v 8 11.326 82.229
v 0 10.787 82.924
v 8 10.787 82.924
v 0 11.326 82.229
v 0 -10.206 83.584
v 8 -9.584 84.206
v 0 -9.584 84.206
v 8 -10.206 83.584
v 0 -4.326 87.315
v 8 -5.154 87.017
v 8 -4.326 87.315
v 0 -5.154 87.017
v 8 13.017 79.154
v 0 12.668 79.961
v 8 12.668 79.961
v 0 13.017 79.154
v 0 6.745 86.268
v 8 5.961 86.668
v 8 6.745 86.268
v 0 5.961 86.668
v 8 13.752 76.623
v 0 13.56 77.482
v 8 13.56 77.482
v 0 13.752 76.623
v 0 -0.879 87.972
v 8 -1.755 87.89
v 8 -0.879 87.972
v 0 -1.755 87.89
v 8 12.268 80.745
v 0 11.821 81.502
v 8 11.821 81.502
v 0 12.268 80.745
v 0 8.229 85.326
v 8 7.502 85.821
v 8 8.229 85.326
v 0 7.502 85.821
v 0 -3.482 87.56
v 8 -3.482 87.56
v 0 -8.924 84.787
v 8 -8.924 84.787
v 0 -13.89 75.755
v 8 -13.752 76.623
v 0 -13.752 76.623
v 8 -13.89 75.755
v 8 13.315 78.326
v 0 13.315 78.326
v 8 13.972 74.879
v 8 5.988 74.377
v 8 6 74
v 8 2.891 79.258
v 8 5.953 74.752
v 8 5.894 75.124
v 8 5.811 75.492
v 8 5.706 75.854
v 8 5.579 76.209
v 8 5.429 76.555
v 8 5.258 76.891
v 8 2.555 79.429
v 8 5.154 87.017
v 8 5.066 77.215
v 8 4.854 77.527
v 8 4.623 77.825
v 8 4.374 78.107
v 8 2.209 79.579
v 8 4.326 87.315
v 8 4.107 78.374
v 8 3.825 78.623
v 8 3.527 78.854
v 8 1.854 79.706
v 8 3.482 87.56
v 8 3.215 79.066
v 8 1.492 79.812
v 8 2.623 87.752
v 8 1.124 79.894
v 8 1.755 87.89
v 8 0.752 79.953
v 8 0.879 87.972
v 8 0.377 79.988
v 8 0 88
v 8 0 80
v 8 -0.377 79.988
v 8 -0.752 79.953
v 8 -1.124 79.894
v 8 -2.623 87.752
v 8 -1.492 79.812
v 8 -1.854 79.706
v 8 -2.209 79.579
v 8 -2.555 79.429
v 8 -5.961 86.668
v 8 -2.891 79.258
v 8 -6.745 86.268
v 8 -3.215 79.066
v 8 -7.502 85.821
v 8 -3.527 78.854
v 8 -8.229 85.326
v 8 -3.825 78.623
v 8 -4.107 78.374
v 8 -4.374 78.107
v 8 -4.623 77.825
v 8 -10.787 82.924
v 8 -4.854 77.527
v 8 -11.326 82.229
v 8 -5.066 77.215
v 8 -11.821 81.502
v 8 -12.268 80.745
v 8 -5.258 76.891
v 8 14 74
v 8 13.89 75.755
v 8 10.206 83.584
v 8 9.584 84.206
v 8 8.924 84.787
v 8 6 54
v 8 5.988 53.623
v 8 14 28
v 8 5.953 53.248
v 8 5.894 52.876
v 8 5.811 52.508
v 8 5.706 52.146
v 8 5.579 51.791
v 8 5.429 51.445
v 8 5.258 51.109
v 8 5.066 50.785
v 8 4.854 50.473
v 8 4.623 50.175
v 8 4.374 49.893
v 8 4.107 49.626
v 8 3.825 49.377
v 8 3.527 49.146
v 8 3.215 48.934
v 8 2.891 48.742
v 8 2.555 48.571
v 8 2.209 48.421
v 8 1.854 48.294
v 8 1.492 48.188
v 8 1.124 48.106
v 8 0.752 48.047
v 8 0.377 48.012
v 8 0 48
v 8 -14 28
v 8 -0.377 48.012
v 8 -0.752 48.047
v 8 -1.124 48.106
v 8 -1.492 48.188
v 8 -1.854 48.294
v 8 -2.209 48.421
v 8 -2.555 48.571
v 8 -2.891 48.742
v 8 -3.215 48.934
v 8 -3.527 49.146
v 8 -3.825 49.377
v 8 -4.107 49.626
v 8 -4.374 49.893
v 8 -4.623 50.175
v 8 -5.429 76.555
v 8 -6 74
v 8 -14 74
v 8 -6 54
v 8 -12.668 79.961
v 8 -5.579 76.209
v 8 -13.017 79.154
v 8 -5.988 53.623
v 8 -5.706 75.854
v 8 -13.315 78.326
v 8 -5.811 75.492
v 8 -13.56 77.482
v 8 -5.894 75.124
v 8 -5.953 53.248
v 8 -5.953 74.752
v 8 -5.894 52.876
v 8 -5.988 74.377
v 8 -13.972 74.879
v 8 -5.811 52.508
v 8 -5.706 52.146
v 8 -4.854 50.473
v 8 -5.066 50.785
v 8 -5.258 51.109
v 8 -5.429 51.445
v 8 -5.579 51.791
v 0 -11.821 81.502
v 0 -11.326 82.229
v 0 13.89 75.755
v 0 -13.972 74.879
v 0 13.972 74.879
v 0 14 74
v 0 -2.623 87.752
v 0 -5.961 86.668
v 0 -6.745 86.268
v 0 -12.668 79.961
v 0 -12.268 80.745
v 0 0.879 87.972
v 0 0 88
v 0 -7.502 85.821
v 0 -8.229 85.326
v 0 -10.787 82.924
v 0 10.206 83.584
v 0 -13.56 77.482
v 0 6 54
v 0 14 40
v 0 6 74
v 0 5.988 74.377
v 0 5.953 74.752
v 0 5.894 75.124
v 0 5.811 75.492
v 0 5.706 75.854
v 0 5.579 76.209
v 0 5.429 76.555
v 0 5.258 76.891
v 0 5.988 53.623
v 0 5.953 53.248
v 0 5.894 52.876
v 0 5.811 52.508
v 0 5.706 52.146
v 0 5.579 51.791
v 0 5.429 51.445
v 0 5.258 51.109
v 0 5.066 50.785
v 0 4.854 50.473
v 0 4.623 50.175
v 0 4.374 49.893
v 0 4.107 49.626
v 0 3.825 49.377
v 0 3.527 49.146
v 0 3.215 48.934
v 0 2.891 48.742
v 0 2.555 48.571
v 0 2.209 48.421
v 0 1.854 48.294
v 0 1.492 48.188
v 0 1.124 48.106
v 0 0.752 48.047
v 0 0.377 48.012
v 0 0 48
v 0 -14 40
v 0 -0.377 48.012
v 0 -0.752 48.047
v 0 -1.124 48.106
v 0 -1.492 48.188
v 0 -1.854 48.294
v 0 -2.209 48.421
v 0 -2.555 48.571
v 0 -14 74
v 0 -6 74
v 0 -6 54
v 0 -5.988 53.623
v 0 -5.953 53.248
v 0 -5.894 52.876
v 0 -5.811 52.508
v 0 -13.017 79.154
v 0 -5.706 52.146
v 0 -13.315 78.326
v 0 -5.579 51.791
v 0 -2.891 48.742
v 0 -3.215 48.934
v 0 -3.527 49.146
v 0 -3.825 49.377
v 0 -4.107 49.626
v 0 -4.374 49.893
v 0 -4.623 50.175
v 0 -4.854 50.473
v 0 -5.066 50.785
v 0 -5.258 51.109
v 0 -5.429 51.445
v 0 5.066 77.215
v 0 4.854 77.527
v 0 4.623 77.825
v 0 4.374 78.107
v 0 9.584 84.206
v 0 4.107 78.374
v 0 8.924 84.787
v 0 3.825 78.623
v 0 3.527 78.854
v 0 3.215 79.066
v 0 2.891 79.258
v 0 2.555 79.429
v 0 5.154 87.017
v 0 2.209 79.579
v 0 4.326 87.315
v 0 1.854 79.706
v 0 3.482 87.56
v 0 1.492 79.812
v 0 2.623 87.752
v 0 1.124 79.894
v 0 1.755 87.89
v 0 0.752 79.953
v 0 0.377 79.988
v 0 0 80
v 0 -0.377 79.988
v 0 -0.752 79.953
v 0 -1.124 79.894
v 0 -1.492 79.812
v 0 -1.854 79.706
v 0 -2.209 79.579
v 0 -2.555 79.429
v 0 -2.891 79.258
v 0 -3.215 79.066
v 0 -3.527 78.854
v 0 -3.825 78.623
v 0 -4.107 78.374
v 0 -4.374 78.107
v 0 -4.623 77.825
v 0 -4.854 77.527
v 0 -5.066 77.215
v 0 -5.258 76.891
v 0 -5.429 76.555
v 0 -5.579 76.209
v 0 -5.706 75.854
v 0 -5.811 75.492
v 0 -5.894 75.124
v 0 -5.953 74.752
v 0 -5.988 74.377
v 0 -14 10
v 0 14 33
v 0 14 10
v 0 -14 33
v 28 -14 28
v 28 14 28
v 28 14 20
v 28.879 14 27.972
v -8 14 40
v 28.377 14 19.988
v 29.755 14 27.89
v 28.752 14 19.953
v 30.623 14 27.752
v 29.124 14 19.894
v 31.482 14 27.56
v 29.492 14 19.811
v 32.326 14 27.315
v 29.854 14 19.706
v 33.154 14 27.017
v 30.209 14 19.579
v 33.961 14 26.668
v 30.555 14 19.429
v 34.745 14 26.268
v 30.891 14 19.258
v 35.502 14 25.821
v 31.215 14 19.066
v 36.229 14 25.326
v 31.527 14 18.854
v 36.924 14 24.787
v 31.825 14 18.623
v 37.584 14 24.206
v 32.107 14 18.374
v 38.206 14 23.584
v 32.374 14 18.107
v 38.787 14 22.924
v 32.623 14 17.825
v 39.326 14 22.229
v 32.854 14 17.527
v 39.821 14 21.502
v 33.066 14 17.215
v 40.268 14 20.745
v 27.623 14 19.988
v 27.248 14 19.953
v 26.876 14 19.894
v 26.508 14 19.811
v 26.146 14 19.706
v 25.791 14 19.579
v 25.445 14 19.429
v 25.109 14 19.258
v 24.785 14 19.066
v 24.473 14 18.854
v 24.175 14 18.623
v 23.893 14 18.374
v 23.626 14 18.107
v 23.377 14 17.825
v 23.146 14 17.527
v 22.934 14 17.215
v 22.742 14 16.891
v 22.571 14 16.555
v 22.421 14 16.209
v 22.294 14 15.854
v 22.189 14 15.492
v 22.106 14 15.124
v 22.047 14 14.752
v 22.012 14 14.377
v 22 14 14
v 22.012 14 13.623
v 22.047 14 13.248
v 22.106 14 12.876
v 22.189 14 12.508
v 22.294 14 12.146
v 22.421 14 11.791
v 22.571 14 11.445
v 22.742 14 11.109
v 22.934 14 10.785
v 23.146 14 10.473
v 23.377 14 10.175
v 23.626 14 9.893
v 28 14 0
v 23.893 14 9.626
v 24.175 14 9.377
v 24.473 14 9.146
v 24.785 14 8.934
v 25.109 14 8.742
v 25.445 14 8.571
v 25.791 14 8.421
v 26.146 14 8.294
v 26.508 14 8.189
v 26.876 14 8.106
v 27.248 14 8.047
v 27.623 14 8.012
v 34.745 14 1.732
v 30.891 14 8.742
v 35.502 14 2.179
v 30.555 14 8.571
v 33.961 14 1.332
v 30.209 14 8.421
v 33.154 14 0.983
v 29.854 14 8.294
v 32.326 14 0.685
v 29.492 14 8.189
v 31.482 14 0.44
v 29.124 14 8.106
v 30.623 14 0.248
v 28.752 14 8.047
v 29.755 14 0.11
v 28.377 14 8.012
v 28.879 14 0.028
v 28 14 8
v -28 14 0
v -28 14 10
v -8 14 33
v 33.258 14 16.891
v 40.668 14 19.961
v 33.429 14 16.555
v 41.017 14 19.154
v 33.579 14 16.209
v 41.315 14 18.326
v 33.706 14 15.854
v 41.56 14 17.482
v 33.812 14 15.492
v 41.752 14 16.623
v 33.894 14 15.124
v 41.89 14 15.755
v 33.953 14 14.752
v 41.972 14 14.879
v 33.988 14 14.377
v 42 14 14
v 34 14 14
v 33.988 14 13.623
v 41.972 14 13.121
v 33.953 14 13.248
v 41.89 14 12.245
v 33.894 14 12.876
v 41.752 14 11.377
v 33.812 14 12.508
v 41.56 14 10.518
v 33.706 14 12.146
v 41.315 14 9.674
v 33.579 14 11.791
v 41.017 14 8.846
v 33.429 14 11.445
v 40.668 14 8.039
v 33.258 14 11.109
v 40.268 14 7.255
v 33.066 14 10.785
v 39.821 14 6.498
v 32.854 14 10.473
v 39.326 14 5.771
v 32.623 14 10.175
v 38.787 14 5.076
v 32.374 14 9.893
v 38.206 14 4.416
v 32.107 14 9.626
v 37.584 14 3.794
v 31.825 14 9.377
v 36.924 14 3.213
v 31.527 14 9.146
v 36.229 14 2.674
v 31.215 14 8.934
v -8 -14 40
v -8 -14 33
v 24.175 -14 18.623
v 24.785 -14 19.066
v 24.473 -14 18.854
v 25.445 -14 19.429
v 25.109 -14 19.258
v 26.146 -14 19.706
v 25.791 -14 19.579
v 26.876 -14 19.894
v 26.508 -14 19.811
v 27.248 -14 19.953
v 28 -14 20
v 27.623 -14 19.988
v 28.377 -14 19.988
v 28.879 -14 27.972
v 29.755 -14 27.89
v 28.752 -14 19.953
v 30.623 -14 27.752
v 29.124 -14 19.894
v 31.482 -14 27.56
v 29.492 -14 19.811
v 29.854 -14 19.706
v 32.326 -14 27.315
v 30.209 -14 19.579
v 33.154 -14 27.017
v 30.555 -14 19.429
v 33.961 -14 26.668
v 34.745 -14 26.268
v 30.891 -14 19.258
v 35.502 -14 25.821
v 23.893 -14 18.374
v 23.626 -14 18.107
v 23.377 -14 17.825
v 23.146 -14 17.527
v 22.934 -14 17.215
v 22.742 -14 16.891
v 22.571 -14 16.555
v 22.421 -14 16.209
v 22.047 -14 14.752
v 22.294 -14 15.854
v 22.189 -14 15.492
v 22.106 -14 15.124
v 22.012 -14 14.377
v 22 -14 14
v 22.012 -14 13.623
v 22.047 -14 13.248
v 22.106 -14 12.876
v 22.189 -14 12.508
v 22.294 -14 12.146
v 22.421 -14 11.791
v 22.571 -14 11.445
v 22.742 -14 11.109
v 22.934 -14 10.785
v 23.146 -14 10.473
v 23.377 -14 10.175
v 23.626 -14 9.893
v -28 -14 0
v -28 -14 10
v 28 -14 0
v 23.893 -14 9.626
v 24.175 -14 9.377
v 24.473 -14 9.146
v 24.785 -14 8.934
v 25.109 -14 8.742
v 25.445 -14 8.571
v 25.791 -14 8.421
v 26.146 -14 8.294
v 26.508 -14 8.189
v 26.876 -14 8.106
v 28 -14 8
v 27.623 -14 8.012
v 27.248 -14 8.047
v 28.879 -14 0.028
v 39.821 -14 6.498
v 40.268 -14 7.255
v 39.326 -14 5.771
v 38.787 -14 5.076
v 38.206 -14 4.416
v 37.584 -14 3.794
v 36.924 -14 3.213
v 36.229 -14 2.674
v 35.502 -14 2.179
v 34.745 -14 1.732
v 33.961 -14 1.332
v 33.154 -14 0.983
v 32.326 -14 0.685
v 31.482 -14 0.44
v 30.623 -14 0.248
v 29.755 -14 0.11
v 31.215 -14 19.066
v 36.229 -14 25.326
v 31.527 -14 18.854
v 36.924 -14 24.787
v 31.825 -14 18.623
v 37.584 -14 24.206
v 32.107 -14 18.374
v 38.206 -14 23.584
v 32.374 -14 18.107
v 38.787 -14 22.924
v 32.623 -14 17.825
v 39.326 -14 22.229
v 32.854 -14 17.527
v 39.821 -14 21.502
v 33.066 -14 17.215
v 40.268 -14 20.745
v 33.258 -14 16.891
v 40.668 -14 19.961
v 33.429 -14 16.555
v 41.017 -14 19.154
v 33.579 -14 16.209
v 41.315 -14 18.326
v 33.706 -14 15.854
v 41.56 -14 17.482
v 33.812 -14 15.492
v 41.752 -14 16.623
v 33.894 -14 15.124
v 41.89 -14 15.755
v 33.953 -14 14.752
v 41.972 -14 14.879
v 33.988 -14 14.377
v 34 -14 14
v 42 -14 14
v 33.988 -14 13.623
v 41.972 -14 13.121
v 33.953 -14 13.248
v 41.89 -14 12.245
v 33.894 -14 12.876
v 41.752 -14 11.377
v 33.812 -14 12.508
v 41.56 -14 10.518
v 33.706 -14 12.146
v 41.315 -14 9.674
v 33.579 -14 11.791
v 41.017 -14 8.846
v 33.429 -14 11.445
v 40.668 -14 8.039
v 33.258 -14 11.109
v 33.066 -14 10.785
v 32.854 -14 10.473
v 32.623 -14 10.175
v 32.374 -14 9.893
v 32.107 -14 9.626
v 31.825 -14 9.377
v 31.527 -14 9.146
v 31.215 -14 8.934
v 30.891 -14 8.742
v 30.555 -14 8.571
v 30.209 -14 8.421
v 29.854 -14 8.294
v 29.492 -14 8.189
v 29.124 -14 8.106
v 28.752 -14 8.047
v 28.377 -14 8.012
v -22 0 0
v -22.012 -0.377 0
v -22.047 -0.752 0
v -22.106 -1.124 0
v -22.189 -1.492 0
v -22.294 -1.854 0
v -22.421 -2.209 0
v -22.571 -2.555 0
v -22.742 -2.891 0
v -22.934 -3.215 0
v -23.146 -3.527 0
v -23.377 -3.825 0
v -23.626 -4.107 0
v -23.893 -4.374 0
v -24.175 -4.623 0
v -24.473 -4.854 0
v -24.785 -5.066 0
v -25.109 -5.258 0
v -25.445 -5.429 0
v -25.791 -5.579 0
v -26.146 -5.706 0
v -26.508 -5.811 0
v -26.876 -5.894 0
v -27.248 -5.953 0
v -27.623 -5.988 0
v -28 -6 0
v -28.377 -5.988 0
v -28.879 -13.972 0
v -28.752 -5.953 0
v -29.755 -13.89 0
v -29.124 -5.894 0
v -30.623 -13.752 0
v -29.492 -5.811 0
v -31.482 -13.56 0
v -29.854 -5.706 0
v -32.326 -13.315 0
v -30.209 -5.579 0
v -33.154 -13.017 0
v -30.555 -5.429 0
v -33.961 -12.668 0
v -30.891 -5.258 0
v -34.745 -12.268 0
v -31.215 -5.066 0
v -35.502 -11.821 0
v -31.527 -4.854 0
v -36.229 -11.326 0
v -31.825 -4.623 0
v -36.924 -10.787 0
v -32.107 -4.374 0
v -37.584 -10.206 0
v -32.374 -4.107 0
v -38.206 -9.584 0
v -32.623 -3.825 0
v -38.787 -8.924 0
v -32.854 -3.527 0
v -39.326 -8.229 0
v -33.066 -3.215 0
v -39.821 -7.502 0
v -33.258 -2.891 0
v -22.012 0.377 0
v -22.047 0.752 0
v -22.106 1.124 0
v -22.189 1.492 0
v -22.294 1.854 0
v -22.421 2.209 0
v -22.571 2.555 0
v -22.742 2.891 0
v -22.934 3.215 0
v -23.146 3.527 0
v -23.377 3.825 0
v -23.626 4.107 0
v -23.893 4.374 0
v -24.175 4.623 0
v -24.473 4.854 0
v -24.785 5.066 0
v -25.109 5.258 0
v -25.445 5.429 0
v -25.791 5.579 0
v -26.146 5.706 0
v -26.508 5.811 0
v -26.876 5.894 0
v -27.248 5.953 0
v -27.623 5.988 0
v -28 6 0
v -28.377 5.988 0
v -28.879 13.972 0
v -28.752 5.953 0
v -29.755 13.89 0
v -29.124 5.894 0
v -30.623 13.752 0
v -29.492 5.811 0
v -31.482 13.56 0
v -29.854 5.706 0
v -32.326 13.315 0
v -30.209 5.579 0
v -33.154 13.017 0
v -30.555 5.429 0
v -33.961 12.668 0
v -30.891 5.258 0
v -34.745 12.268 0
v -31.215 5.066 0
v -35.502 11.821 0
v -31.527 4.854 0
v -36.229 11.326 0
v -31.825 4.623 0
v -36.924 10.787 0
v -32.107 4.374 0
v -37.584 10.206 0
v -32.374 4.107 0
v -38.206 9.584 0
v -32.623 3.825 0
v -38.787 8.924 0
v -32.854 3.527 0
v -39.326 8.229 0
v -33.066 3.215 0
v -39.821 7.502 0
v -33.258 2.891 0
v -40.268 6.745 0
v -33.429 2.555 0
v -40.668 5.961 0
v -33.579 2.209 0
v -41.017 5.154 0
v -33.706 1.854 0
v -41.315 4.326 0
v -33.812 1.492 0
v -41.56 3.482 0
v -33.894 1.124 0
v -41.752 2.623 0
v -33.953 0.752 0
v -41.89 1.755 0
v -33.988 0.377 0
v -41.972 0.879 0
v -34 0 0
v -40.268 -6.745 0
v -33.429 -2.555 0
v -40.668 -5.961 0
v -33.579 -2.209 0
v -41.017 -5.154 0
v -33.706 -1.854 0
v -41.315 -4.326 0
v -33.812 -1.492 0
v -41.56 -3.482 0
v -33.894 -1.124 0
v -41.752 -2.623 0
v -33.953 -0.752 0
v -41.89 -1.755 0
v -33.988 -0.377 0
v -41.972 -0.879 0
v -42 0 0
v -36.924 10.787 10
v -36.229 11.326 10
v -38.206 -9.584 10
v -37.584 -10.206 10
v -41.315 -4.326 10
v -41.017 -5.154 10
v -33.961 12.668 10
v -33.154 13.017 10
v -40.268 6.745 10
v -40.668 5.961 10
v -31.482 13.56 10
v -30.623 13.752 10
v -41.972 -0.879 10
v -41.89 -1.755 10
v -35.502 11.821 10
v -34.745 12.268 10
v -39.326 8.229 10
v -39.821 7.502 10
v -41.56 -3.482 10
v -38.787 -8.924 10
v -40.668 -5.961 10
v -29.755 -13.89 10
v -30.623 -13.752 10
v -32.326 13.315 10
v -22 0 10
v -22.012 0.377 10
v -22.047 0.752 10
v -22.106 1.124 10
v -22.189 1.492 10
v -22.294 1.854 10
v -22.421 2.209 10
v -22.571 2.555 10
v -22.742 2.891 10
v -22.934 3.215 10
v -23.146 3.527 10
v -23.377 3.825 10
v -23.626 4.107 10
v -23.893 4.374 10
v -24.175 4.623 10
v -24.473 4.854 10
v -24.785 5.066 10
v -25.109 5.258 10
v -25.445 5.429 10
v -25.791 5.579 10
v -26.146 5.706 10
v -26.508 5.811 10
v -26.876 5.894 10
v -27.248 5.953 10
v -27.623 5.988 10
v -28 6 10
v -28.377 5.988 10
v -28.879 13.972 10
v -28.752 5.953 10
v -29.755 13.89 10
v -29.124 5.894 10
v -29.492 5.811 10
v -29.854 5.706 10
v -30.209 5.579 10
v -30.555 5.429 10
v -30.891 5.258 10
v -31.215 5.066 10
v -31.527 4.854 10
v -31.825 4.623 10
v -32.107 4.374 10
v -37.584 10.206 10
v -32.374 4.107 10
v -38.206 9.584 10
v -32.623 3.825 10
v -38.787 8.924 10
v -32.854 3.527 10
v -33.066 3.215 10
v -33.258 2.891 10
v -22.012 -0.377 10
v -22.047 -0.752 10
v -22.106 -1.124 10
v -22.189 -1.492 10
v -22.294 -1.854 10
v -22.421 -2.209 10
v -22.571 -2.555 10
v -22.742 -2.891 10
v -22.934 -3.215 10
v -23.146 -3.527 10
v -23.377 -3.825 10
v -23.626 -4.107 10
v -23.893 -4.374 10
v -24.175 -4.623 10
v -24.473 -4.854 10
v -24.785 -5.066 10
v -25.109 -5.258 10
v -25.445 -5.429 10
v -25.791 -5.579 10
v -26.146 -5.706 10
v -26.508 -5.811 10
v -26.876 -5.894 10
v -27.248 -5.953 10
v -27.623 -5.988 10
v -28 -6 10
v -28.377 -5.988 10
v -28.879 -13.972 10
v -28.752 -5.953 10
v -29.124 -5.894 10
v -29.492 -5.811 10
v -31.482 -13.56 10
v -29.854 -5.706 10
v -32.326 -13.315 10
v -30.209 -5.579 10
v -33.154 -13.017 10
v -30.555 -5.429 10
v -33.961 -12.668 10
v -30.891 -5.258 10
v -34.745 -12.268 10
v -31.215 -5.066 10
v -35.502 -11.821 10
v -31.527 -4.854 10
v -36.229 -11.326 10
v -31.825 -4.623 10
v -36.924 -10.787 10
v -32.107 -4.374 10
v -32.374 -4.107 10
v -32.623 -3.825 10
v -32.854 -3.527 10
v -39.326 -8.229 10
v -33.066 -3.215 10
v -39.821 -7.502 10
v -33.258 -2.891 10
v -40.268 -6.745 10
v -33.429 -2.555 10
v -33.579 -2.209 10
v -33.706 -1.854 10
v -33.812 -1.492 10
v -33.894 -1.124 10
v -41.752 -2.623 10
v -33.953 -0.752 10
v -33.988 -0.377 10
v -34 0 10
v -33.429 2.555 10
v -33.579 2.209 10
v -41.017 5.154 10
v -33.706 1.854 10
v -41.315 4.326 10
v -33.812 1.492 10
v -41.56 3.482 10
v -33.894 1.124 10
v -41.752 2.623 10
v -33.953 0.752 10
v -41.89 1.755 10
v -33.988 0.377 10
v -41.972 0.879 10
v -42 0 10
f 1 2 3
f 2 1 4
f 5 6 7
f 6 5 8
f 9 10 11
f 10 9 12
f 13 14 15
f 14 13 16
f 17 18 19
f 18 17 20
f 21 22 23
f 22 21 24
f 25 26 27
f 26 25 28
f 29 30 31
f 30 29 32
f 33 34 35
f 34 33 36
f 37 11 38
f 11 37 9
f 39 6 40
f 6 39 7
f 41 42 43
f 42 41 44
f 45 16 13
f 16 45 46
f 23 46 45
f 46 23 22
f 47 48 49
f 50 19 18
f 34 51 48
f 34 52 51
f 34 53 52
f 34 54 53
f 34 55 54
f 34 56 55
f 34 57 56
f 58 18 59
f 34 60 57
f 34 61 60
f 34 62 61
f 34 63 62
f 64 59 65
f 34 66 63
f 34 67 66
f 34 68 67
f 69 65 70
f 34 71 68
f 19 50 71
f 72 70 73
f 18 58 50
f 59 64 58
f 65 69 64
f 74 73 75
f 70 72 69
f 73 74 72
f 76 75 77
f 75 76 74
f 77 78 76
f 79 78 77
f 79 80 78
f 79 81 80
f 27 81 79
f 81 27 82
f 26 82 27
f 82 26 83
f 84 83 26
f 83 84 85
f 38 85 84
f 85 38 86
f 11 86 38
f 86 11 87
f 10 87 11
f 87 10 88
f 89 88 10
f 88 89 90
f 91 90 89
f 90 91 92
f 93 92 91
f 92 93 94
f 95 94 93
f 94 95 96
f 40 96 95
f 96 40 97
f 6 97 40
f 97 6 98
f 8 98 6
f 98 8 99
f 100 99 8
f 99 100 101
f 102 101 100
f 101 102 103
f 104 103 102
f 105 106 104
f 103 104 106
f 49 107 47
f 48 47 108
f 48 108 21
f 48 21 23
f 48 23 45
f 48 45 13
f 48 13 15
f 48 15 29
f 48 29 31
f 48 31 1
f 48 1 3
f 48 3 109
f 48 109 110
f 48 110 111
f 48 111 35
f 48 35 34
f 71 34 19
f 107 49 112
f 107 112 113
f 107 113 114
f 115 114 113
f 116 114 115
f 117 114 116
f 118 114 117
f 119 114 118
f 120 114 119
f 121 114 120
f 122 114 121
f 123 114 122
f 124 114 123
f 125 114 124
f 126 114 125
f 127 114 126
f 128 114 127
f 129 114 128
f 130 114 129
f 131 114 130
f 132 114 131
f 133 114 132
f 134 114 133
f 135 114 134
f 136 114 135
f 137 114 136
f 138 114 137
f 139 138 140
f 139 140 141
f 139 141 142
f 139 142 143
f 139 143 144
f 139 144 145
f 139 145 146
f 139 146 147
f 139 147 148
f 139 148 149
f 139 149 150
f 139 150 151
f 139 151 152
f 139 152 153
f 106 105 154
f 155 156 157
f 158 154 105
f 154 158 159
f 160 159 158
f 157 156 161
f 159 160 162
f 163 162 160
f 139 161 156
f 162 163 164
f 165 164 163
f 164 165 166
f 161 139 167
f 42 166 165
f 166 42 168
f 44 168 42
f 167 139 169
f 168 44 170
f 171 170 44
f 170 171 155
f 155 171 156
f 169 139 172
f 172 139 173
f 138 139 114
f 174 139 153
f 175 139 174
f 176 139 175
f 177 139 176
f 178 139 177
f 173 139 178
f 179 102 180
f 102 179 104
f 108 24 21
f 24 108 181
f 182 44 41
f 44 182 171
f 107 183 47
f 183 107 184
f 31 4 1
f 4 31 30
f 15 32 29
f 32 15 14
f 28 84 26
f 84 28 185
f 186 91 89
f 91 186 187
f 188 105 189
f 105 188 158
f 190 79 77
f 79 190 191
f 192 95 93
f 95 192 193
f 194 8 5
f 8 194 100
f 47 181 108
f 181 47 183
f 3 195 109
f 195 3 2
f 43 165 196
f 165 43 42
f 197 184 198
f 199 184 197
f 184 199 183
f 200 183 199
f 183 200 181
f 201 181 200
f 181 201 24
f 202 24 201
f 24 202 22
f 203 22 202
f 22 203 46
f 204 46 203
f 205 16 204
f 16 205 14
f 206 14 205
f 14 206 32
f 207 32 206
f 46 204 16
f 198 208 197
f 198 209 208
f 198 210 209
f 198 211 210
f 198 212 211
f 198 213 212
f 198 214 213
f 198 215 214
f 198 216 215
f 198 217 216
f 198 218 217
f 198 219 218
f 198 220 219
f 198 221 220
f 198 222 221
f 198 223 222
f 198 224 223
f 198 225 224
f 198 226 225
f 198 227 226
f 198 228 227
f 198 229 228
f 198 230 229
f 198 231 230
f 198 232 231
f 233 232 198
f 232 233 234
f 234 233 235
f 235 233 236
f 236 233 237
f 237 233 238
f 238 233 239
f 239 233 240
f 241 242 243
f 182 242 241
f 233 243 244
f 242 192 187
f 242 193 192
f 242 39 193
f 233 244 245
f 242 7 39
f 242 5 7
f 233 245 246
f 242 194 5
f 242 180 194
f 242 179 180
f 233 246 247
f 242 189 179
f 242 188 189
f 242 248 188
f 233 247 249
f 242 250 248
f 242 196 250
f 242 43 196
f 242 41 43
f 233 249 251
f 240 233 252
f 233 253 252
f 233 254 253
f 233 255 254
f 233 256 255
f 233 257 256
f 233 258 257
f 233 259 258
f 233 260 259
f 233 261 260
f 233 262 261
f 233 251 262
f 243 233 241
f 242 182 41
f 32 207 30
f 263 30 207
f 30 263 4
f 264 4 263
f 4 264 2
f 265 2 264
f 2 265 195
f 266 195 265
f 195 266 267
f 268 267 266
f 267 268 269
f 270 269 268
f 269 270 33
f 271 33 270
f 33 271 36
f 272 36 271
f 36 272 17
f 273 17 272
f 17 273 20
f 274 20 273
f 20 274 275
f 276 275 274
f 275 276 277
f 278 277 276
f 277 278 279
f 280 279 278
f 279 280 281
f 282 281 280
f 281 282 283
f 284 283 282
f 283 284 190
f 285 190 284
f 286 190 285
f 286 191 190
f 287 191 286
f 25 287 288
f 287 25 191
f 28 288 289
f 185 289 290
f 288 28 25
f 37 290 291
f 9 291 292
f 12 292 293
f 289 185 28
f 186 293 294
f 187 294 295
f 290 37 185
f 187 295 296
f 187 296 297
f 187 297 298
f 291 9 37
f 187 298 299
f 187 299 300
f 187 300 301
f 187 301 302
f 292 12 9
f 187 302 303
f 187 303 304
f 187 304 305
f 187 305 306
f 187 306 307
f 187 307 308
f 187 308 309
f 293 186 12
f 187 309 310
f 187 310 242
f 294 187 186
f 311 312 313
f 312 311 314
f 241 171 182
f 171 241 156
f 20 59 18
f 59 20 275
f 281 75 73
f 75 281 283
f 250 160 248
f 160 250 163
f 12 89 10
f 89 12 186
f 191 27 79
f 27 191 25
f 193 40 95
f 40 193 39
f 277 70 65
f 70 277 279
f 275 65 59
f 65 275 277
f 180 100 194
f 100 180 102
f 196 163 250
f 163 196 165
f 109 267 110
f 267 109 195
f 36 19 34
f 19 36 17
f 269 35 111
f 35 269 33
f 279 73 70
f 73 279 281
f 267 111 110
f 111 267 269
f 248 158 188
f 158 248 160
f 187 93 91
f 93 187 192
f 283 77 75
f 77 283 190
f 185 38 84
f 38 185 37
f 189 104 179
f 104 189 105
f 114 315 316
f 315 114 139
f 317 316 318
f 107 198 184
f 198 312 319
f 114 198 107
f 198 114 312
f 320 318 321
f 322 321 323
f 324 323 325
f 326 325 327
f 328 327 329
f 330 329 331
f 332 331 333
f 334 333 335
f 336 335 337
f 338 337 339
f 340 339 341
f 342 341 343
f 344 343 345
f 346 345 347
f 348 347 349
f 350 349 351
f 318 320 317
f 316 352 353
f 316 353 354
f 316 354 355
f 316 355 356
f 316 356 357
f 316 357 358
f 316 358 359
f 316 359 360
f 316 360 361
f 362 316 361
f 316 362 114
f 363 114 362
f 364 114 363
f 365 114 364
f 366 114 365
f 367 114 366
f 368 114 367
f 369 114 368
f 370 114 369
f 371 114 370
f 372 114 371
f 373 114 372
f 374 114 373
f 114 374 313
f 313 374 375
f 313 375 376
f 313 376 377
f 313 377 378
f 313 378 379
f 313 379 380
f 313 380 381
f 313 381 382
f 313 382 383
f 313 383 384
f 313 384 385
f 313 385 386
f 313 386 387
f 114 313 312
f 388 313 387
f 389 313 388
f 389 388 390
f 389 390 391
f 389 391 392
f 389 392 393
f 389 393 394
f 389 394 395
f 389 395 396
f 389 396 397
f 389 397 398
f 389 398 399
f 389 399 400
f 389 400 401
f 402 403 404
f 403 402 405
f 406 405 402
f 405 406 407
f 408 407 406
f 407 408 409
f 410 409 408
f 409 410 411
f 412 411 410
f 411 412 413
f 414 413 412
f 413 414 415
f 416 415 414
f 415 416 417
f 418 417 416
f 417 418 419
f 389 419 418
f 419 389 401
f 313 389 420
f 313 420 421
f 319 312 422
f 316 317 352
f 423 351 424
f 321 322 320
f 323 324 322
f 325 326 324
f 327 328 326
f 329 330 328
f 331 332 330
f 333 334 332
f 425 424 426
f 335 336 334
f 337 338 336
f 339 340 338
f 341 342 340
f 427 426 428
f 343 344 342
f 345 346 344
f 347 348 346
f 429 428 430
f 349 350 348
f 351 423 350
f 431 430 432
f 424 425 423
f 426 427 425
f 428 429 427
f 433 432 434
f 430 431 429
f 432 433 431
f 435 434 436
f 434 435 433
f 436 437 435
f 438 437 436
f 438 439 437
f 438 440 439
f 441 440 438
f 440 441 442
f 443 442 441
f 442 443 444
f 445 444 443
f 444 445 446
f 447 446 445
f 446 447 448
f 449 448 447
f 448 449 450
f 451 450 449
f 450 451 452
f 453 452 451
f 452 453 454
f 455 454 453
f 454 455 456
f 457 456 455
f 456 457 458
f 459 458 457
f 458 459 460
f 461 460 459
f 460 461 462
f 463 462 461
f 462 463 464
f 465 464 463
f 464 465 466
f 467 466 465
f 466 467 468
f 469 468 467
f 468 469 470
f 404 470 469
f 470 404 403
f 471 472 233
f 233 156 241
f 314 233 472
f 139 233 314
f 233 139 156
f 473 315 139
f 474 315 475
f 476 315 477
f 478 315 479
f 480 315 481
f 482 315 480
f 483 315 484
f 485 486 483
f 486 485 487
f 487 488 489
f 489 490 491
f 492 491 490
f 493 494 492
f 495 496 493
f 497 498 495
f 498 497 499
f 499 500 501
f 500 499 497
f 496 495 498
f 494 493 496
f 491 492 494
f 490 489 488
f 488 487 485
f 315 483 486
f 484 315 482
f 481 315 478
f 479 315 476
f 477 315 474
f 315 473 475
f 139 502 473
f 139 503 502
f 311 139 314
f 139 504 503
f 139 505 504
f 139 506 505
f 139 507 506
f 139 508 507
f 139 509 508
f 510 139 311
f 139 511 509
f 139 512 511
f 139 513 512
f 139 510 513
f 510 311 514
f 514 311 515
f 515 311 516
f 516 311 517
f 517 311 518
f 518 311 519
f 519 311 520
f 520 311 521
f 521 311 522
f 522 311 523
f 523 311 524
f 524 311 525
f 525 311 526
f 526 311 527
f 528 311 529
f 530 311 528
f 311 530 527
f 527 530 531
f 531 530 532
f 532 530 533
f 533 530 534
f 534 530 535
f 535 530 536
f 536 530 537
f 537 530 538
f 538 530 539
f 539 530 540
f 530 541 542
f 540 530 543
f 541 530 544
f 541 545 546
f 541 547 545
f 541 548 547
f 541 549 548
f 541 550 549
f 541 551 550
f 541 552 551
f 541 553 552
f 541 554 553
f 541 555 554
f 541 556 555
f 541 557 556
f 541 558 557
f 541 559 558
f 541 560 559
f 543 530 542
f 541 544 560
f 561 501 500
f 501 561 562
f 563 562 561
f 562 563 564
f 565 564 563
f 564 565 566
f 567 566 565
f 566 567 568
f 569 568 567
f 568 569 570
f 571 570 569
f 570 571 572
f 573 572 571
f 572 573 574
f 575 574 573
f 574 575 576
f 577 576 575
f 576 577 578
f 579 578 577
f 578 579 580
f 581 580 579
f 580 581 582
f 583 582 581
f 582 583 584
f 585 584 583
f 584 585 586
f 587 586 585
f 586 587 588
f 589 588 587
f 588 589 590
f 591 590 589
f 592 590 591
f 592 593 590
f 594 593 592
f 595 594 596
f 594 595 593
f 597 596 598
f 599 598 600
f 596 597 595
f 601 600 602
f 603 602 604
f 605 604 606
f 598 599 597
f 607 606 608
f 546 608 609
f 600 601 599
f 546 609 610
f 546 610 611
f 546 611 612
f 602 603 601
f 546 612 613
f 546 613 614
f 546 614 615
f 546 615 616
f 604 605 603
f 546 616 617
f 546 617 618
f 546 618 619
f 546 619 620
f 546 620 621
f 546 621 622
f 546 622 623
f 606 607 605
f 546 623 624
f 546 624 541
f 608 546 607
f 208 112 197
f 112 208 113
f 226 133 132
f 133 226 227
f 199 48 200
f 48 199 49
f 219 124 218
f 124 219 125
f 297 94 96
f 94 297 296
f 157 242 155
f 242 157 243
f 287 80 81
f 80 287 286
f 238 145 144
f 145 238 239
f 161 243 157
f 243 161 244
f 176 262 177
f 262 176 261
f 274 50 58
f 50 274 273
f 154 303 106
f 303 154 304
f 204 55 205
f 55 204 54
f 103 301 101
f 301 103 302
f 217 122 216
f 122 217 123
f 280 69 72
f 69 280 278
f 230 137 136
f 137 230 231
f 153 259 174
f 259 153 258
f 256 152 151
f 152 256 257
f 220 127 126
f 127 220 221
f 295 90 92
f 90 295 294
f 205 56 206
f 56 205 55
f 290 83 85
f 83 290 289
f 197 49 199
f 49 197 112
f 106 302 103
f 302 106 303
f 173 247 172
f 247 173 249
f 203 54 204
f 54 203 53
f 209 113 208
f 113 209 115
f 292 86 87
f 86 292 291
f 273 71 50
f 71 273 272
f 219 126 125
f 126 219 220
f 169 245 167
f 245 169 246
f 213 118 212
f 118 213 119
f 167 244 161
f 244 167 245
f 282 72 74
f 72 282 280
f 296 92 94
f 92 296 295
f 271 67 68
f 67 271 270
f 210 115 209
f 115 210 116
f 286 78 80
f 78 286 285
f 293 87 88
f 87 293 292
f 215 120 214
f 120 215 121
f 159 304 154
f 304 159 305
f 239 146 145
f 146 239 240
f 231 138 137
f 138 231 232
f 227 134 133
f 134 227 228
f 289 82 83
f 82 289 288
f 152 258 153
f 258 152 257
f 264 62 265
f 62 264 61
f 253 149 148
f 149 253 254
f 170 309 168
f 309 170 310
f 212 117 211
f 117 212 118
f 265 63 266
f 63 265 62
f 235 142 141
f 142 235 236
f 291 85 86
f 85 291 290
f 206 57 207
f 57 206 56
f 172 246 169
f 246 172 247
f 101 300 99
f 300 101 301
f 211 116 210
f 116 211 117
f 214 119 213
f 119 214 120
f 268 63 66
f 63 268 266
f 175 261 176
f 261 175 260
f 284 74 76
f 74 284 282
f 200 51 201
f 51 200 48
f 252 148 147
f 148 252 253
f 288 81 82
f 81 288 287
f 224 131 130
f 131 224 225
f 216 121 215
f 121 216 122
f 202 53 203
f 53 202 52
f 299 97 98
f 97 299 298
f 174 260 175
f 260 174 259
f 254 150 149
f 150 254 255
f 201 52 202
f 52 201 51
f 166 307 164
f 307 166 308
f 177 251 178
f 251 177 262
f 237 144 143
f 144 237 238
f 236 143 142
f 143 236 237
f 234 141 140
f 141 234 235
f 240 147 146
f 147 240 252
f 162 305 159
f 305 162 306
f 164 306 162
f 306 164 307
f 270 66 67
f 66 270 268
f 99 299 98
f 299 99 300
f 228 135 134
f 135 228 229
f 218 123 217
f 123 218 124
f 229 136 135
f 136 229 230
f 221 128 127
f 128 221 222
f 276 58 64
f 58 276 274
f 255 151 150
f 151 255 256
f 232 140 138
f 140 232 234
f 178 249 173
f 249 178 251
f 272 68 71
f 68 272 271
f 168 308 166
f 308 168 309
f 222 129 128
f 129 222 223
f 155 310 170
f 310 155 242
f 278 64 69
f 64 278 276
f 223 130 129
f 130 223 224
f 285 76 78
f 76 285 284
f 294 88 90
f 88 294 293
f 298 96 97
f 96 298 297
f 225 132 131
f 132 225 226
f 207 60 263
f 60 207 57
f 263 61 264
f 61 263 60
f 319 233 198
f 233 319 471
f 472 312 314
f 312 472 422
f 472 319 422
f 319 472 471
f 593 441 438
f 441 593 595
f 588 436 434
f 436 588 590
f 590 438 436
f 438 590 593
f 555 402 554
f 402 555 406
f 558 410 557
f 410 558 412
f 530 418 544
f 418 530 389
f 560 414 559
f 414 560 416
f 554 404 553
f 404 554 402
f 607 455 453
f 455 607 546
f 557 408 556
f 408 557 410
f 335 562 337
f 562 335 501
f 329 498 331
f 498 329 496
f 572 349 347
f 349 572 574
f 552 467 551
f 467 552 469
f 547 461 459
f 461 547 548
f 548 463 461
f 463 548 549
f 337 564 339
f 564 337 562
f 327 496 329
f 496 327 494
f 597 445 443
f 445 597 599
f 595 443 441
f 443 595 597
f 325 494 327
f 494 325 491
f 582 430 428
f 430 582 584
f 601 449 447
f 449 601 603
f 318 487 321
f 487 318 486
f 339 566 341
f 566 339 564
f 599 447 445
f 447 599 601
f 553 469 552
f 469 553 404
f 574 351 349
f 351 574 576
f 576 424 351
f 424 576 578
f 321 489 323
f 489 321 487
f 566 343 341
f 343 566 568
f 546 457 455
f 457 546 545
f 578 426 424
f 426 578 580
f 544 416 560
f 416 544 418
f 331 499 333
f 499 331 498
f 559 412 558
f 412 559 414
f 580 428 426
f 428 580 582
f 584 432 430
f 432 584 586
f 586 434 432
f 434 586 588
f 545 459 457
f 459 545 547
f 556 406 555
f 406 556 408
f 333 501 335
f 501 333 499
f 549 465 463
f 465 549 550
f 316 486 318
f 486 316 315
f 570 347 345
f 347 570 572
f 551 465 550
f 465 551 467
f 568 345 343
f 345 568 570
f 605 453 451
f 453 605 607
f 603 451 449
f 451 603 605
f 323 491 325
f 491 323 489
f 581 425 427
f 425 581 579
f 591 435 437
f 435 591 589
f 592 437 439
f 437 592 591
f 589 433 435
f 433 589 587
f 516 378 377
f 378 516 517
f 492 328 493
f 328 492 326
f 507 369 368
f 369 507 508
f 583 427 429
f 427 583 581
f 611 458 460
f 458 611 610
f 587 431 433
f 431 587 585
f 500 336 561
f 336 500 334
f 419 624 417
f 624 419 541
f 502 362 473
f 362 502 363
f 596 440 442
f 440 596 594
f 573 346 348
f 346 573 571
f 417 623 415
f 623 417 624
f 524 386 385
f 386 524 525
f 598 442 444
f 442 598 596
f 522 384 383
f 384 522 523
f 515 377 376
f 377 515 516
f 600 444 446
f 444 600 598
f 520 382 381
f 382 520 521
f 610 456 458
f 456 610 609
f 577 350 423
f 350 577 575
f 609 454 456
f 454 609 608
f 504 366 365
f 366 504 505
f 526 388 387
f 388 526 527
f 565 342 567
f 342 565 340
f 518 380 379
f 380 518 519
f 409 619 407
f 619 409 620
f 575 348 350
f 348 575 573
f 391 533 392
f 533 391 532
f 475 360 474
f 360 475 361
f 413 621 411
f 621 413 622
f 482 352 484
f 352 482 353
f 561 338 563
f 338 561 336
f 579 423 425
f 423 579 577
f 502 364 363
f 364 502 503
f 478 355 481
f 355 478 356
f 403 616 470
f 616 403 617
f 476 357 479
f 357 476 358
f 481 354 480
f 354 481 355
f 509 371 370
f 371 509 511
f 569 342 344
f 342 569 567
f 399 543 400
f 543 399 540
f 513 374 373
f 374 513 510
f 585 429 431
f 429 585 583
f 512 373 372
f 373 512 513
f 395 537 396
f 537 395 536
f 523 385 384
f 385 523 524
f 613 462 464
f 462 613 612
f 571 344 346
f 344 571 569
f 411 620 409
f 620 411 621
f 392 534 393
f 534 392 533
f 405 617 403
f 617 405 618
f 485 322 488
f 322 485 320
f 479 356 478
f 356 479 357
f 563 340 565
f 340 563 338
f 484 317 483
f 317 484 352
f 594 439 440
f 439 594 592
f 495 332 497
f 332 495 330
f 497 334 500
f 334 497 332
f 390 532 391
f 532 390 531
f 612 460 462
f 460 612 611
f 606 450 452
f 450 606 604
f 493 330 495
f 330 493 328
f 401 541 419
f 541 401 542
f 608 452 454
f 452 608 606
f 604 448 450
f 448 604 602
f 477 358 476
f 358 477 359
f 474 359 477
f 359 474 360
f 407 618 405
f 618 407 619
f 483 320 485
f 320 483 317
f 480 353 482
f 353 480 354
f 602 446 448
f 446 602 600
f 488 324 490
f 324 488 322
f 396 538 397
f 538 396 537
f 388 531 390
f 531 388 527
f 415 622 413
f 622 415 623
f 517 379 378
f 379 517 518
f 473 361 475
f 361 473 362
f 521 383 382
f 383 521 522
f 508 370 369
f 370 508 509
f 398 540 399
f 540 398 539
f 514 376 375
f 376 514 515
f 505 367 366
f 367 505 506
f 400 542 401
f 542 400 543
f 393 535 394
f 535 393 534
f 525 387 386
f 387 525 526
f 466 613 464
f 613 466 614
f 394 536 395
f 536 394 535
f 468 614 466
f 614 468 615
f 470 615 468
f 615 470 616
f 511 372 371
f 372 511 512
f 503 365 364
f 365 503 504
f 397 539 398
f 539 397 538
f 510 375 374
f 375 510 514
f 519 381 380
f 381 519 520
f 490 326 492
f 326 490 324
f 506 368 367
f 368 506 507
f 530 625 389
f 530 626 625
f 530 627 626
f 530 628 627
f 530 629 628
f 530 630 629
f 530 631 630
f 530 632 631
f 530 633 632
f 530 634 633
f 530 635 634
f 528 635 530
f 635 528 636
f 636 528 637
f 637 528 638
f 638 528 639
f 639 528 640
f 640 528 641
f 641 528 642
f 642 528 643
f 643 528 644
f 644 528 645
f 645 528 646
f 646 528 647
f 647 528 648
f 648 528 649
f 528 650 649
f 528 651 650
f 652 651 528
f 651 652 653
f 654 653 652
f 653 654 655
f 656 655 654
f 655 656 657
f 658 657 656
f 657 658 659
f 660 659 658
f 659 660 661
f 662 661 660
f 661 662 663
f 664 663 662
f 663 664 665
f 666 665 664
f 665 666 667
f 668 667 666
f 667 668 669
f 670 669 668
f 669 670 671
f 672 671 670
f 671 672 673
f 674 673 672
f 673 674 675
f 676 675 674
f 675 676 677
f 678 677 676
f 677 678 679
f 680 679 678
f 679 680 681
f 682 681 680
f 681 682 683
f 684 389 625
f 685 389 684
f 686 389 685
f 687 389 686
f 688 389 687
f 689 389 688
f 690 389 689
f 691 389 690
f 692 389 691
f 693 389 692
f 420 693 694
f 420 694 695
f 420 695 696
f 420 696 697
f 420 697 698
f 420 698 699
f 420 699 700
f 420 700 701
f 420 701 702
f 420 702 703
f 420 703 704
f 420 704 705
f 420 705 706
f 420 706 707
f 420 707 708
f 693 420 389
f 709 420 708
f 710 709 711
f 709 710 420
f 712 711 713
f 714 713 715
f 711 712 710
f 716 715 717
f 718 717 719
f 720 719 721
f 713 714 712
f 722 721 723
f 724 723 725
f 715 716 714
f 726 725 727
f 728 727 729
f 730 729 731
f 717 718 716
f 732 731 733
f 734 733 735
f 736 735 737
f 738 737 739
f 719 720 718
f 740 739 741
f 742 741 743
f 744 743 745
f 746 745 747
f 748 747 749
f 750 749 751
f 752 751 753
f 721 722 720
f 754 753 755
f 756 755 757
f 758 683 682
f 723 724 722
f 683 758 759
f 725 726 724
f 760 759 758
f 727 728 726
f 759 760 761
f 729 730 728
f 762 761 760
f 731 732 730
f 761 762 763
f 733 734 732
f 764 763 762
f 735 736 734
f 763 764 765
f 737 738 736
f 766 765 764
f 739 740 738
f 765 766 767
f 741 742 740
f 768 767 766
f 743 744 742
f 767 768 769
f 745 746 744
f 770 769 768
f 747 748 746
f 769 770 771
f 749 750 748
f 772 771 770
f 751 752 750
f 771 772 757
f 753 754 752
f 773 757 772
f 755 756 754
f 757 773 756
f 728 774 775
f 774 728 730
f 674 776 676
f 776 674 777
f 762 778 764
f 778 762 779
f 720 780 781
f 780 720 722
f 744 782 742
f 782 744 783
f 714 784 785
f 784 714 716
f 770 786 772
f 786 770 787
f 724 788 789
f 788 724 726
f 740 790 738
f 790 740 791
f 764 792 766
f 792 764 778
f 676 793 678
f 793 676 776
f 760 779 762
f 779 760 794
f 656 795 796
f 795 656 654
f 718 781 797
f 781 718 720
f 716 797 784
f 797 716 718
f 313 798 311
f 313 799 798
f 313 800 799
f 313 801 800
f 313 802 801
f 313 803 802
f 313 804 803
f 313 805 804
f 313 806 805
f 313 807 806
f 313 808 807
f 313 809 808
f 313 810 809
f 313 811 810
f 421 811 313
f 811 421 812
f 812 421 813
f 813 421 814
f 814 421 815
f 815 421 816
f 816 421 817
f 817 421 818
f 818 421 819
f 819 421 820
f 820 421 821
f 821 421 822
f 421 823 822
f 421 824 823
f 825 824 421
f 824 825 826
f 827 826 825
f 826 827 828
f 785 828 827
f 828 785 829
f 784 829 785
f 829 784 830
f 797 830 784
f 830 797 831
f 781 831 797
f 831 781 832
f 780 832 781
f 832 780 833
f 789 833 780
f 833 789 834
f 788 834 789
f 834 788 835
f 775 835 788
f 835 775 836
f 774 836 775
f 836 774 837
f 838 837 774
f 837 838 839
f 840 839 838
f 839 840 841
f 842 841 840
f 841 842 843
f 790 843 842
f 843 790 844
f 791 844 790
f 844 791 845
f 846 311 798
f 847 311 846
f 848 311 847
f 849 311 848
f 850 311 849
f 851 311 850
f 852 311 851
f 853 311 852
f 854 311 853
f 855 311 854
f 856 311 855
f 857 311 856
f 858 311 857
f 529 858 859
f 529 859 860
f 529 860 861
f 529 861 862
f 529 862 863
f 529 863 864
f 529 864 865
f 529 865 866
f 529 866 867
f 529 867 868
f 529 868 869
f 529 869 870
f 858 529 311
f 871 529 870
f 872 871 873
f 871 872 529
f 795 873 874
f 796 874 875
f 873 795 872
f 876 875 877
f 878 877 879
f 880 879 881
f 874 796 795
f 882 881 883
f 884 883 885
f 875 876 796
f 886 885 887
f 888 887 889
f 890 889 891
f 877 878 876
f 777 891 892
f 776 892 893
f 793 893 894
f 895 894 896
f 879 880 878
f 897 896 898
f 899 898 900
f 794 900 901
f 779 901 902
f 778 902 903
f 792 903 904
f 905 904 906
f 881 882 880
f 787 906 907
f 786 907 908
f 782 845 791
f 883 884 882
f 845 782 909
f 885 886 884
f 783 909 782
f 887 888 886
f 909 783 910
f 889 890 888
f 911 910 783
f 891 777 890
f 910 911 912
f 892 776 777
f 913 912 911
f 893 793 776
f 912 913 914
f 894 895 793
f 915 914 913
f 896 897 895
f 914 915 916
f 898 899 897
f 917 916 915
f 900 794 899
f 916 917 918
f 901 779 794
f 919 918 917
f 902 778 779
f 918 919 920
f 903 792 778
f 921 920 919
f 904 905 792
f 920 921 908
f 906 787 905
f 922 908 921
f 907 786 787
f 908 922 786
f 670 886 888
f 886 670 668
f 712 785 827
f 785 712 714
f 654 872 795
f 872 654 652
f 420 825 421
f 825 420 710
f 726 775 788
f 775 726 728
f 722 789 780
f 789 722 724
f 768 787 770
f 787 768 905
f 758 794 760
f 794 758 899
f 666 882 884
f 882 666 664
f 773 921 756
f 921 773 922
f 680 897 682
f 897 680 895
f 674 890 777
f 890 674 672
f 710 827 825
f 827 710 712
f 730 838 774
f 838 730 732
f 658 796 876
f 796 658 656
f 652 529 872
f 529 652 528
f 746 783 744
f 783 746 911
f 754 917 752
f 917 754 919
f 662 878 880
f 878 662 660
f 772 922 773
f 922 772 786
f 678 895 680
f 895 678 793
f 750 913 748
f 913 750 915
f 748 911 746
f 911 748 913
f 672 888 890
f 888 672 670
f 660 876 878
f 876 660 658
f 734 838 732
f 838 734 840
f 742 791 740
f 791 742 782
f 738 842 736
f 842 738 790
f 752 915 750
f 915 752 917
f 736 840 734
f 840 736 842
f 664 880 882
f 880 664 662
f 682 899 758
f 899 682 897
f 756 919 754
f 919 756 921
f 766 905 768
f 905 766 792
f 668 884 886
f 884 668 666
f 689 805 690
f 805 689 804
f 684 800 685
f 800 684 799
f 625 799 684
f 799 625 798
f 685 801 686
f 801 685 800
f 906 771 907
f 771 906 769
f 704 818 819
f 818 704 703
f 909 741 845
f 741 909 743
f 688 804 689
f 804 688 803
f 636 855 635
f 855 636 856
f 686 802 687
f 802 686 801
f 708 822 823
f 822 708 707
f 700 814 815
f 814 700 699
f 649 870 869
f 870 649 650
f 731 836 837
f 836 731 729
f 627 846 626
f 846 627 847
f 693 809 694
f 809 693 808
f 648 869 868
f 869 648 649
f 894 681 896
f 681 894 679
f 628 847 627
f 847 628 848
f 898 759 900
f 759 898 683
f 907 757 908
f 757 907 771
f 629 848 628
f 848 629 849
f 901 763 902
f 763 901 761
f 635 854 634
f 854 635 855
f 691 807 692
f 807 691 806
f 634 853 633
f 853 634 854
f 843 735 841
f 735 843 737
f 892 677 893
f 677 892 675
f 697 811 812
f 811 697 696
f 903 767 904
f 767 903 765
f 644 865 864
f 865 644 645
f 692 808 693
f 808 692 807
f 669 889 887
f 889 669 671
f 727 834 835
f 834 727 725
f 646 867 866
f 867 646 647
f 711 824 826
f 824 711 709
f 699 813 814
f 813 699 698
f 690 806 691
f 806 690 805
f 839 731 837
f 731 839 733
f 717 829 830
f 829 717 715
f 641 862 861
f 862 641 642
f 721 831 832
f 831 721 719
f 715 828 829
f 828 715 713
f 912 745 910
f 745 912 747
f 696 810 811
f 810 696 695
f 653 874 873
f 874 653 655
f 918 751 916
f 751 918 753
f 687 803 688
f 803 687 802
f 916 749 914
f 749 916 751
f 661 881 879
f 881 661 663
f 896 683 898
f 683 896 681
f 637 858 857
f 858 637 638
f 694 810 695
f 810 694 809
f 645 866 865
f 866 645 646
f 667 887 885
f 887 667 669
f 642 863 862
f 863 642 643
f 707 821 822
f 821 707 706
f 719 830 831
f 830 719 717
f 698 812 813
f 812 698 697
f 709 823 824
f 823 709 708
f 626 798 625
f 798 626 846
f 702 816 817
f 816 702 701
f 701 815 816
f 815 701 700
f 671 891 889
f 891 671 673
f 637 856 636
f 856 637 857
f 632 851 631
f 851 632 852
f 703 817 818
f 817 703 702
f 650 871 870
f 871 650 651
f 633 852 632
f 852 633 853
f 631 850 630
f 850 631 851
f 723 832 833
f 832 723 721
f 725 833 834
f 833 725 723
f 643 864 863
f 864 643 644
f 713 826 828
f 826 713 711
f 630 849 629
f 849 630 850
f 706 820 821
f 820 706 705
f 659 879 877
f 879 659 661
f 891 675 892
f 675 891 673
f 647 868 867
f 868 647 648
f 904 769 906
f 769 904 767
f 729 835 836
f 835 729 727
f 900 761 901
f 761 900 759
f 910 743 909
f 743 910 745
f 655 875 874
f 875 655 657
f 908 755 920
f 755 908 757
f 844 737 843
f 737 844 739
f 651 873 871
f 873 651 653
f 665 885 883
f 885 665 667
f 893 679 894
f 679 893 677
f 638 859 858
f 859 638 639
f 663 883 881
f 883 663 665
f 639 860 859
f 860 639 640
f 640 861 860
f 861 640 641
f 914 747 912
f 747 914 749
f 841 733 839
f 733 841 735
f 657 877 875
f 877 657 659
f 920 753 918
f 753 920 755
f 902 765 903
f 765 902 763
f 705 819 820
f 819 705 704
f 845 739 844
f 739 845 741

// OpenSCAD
$fn=100;
mm=1; // define units
degrees=1;

include <lib.scad>

// TODO: This needs cleaning up.
module example_121(){
     width=28*mm;
     rad=14;
     peg_hold=6;
     module slot_plate(){
	  thickness=8;
	  module nib(){
	       Cube([8/*missing*/,width,7],center=Y);
	  }
	  translate(-thickness*X+5*Z){
	       nib();}
	  rotate(90*Y){
	       translate(46*-X){
		    difference(){
			 arch(r=width/2,h=60,t=thickness);
			 hull(){
			      wcylinder(r=peg_hold,h=thickness);
			      translate(20*X){
				   wcylinder(r=peg_hold,h=thickness);}}}}}}
     module body(){
	  outer_glue(){
	       translate(28*X+rad*Z){
		    rotate(90*X){
			 annulus(ro=rad,ri=peg_hold,h=width,center=true);}}
	       Cube([28,width,28],center=Y);}}
     module bottom_plate(){
	  outer_glue(){
	  translate(-28*X){
	  annulus(ro=rad,ri=peg_hold,t=10);}
	  Cube([-28,width,10],center=Y);}}
     translate(width*Z)
	  slot_plate();
     body();
     bottom_plate();
     }

example_121();
